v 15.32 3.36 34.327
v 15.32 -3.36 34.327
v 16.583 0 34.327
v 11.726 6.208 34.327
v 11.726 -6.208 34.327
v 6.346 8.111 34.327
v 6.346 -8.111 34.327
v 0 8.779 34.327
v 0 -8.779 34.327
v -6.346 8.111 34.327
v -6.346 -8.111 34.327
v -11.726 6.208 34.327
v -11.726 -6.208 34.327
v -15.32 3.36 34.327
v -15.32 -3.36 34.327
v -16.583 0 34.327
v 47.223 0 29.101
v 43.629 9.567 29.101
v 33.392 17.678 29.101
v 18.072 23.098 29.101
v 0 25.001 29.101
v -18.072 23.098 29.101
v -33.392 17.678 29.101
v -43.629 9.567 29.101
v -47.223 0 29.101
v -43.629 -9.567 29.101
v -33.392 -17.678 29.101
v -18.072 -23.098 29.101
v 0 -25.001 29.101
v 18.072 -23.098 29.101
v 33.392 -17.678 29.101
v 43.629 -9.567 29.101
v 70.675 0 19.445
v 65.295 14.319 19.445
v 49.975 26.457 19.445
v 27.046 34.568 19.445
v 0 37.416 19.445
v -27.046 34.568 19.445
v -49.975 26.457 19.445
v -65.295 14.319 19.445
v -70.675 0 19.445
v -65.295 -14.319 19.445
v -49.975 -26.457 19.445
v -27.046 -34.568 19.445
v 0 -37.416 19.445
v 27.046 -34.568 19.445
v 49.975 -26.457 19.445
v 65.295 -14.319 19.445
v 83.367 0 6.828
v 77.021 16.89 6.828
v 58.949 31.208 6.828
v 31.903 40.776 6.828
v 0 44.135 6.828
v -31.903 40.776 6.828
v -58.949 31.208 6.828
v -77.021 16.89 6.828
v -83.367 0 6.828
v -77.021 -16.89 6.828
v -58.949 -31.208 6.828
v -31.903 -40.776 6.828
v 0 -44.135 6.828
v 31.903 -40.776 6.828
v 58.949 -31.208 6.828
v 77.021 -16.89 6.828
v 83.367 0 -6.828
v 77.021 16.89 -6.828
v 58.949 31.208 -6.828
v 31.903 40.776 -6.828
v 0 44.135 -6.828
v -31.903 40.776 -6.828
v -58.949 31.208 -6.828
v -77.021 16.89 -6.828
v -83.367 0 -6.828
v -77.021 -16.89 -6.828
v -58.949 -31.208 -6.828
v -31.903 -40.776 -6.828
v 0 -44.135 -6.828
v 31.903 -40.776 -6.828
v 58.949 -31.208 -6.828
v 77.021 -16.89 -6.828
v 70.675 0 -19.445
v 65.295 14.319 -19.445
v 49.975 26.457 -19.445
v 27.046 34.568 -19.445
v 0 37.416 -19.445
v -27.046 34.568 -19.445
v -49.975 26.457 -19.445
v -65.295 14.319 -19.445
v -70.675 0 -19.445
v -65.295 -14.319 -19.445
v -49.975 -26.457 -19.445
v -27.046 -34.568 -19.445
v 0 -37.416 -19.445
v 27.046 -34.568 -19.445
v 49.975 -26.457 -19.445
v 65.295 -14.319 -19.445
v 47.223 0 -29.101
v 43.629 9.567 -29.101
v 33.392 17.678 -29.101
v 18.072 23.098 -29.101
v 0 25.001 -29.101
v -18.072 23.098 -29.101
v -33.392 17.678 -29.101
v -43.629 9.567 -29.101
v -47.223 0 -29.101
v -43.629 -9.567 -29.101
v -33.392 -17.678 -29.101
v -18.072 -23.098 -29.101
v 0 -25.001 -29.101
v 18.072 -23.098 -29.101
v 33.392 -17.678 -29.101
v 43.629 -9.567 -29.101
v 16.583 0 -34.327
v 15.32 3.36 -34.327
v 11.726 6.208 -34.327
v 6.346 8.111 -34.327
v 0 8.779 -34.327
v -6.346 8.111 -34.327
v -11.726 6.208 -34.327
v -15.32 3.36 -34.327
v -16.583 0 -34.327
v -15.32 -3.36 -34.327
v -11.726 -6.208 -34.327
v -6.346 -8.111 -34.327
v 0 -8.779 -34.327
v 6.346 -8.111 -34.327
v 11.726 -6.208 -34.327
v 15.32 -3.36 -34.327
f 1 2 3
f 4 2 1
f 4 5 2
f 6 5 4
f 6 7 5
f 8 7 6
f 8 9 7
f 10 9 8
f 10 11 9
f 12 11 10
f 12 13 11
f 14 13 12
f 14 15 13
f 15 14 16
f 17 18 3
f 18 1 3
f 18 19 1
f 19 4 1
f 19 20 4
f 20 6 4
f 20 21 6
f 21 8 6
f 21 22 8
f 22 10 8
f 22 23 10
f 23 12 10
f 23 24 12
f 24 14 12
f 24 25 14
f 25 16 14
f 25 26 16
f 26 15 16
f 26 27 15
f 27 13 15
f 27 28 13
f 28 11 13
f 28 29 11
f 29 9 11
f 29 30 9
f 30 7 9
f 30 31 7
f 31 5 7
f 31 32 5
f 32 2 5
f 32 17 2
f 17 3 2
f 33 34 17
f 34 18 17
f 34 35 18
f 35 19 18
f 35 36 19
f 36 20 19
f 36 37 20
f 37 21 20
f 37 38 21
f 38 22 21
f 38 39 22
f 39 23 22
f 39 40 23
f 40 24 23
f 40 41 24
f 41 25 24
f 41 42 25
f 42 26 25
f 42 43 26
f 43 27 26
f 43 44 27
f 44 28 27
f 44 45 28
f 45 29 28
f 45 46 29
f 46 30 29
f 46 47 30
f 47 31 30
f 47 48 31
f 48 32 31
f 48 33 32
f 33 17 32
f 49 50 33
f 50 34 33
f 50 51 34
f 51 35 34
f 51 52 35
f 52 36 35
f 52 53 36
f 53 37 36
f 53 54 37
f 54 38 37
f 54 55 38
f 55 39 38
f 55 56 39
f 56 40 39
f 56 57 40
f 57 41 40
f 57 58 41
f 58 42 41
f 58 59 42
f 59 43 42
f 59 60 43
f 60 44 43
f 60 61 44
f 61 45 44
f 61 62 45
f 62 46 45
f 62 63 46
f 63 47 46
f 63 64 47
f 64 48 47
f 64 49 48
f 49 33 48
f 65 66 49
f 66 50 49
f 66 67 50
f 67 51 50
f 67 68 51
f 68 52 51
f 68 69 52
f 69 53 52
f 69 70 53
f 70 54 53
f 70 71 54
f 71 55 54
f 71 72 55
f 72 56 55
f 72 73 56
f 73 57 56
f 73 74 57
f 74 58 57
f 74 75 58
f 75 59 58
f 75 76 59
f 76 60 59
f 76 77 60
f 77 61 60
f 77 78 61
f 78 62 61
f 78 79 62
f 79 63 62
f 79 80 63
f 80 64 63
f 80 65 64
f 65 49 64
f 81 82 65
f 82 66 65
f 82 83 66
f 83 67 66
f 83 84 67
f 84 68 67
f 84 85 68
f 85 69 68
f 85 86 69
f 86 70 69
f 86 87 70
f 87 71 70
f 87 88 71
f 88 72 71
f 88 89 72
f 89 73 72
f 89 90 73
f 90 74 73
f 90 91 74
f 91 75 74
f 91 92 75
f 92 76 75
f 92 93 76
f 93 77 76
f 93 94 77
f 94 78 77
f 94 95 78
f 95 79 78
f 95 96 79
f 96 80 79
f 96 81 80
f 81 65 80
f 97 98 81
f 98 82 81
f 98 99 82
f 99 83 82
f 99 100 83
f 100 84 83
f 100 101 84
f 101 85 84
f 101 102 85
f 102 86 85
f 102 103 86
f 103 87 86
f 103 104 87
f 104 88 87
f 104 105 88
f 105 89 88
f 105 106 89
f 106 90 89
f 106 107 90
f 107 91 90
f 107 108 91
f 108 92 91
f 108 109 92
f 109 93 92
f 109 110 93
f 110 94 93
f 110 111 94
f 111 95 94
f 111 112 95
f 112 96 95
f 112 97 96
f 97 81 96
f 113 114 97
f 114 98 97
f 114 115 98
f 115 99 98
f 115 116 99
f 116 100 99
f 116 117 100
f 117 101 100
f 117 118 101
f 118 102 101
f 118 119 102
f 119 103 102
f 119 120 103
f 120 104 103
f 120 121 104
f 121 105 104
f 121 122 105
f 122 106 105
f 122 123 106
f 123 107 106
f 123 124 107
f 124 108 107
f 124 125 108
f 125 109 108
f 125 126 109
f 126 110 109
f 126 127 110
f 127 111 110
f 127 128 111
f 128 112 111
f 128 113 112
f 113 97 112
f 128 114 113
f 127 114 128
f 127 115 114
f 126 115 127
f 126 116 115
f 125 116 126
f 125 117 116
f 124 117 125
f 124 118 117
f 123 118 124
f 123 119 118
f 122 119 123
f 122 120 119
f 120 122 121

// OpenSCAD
// Generated by SolidPython 1.0.1 on 2020-07-29 00:46:53


scale(v = [17, 9, 7]) {
	sphere(r = 5);
}
/***********************************************
*********      SolidPython code:      **********
************************************************
 
# import packages: SolidPython
from solid import *
from solid.utils import *
from itertools import chain, combinations, permutations


class Resize:

    def __init__(self, scad_file):
        self.scad_file = scad_file
        #self.scad_file = import_scad(scad_file)
        # cone/cylinder param:
        self.r1 = 0
        self.r2 = 0
        self.h = 0
        # rectangular prism param:
        self.w = 0
        self.l = 0
        # ellipse param:
        self.r = 0

    # import OpenScad code (file name corresponds to shape)


    # classify shape + parameters
    def assign(self, param1, param2, param3):
        if self.scad_file == 'cone.scad':
            self.r1 = param1
            self.r2 = param2
            self.h = param3
        elif self.scad_file == 'cylinder.scad':
            self.r1 = param1
            self.r2 = param2
            self.h = param3
        elif self.scad_file == 'rectangularPrism.scad':
            self.h = param1
            self.l = param2
            self.w = param3
        else:
            self.r = param1
            self.h = param2

    # resize parameters
    def iterate(self):
        x = range(3, 20, 2)
        i = 1
        if self.scad_file == 'cone.scad':
            tempList = list(permutations(x, 2))
            for temp in tempList:
                param1 = temp[0]
                param2 = temp[1]
                filepath = 'produced_scad_files/' + 'cone' + str(param1) + '_' + str(param2) + '_' + '.scad'
                scad_render_to_file(cylinder(h=param1, r1=param2, r2=0), filepath)

        elif self.scad_file == 'cylinder.scad':
            tempList = list(permutations(x, 3))
            for temp in tempList:
                param1 = temp[0]
                param2 = temp[1]
                filepath = 'produced_scad_files/' + 'cylinder' + str(param1) + '_' + str(param2) + '_' + '.scad'
                scad_render_to_file(cylinder(h=param1, r1=param2, r2=param2), filepath)

        elif self.scad_file == 'rectangularPrism.scad':
            tempList = list(permutations(x, 3))
            for temp in tempList:
                param1 = temp[0]
                param2 = temp[1]
                param3 = temp[2]
                filepath = 'produced_scad_files/' + 'rectangularPrism' + str(param1) + '_' + str(param2) + '_' + str(
                    param3) + '.scad'
                scad_render_to_file(cube(size=(param1, param2, param3)), filepath)

        elif self.scad_file == 'ellipse.scad':
            tempList = list(permutations(x, 4))
            for temp in tempList:
                param1 = temp[0]
                param2 = temp[1]
                param3 = temp[2]
                param4 = temp[3]
                filepath = 'produced_scad_files/' + 'ellipse' + str(param1) + '_' + str(param2) + '_' + str(param3) + '_' + str(param4) + '.scad'
                scad_render_to_file(scale([param1, param2, param3])(sphere(r=param4)), filepath)

    def render_to_scadfile(self):
        scad_render_to_file(scad, 'example.scad') 
 
************************************************/
